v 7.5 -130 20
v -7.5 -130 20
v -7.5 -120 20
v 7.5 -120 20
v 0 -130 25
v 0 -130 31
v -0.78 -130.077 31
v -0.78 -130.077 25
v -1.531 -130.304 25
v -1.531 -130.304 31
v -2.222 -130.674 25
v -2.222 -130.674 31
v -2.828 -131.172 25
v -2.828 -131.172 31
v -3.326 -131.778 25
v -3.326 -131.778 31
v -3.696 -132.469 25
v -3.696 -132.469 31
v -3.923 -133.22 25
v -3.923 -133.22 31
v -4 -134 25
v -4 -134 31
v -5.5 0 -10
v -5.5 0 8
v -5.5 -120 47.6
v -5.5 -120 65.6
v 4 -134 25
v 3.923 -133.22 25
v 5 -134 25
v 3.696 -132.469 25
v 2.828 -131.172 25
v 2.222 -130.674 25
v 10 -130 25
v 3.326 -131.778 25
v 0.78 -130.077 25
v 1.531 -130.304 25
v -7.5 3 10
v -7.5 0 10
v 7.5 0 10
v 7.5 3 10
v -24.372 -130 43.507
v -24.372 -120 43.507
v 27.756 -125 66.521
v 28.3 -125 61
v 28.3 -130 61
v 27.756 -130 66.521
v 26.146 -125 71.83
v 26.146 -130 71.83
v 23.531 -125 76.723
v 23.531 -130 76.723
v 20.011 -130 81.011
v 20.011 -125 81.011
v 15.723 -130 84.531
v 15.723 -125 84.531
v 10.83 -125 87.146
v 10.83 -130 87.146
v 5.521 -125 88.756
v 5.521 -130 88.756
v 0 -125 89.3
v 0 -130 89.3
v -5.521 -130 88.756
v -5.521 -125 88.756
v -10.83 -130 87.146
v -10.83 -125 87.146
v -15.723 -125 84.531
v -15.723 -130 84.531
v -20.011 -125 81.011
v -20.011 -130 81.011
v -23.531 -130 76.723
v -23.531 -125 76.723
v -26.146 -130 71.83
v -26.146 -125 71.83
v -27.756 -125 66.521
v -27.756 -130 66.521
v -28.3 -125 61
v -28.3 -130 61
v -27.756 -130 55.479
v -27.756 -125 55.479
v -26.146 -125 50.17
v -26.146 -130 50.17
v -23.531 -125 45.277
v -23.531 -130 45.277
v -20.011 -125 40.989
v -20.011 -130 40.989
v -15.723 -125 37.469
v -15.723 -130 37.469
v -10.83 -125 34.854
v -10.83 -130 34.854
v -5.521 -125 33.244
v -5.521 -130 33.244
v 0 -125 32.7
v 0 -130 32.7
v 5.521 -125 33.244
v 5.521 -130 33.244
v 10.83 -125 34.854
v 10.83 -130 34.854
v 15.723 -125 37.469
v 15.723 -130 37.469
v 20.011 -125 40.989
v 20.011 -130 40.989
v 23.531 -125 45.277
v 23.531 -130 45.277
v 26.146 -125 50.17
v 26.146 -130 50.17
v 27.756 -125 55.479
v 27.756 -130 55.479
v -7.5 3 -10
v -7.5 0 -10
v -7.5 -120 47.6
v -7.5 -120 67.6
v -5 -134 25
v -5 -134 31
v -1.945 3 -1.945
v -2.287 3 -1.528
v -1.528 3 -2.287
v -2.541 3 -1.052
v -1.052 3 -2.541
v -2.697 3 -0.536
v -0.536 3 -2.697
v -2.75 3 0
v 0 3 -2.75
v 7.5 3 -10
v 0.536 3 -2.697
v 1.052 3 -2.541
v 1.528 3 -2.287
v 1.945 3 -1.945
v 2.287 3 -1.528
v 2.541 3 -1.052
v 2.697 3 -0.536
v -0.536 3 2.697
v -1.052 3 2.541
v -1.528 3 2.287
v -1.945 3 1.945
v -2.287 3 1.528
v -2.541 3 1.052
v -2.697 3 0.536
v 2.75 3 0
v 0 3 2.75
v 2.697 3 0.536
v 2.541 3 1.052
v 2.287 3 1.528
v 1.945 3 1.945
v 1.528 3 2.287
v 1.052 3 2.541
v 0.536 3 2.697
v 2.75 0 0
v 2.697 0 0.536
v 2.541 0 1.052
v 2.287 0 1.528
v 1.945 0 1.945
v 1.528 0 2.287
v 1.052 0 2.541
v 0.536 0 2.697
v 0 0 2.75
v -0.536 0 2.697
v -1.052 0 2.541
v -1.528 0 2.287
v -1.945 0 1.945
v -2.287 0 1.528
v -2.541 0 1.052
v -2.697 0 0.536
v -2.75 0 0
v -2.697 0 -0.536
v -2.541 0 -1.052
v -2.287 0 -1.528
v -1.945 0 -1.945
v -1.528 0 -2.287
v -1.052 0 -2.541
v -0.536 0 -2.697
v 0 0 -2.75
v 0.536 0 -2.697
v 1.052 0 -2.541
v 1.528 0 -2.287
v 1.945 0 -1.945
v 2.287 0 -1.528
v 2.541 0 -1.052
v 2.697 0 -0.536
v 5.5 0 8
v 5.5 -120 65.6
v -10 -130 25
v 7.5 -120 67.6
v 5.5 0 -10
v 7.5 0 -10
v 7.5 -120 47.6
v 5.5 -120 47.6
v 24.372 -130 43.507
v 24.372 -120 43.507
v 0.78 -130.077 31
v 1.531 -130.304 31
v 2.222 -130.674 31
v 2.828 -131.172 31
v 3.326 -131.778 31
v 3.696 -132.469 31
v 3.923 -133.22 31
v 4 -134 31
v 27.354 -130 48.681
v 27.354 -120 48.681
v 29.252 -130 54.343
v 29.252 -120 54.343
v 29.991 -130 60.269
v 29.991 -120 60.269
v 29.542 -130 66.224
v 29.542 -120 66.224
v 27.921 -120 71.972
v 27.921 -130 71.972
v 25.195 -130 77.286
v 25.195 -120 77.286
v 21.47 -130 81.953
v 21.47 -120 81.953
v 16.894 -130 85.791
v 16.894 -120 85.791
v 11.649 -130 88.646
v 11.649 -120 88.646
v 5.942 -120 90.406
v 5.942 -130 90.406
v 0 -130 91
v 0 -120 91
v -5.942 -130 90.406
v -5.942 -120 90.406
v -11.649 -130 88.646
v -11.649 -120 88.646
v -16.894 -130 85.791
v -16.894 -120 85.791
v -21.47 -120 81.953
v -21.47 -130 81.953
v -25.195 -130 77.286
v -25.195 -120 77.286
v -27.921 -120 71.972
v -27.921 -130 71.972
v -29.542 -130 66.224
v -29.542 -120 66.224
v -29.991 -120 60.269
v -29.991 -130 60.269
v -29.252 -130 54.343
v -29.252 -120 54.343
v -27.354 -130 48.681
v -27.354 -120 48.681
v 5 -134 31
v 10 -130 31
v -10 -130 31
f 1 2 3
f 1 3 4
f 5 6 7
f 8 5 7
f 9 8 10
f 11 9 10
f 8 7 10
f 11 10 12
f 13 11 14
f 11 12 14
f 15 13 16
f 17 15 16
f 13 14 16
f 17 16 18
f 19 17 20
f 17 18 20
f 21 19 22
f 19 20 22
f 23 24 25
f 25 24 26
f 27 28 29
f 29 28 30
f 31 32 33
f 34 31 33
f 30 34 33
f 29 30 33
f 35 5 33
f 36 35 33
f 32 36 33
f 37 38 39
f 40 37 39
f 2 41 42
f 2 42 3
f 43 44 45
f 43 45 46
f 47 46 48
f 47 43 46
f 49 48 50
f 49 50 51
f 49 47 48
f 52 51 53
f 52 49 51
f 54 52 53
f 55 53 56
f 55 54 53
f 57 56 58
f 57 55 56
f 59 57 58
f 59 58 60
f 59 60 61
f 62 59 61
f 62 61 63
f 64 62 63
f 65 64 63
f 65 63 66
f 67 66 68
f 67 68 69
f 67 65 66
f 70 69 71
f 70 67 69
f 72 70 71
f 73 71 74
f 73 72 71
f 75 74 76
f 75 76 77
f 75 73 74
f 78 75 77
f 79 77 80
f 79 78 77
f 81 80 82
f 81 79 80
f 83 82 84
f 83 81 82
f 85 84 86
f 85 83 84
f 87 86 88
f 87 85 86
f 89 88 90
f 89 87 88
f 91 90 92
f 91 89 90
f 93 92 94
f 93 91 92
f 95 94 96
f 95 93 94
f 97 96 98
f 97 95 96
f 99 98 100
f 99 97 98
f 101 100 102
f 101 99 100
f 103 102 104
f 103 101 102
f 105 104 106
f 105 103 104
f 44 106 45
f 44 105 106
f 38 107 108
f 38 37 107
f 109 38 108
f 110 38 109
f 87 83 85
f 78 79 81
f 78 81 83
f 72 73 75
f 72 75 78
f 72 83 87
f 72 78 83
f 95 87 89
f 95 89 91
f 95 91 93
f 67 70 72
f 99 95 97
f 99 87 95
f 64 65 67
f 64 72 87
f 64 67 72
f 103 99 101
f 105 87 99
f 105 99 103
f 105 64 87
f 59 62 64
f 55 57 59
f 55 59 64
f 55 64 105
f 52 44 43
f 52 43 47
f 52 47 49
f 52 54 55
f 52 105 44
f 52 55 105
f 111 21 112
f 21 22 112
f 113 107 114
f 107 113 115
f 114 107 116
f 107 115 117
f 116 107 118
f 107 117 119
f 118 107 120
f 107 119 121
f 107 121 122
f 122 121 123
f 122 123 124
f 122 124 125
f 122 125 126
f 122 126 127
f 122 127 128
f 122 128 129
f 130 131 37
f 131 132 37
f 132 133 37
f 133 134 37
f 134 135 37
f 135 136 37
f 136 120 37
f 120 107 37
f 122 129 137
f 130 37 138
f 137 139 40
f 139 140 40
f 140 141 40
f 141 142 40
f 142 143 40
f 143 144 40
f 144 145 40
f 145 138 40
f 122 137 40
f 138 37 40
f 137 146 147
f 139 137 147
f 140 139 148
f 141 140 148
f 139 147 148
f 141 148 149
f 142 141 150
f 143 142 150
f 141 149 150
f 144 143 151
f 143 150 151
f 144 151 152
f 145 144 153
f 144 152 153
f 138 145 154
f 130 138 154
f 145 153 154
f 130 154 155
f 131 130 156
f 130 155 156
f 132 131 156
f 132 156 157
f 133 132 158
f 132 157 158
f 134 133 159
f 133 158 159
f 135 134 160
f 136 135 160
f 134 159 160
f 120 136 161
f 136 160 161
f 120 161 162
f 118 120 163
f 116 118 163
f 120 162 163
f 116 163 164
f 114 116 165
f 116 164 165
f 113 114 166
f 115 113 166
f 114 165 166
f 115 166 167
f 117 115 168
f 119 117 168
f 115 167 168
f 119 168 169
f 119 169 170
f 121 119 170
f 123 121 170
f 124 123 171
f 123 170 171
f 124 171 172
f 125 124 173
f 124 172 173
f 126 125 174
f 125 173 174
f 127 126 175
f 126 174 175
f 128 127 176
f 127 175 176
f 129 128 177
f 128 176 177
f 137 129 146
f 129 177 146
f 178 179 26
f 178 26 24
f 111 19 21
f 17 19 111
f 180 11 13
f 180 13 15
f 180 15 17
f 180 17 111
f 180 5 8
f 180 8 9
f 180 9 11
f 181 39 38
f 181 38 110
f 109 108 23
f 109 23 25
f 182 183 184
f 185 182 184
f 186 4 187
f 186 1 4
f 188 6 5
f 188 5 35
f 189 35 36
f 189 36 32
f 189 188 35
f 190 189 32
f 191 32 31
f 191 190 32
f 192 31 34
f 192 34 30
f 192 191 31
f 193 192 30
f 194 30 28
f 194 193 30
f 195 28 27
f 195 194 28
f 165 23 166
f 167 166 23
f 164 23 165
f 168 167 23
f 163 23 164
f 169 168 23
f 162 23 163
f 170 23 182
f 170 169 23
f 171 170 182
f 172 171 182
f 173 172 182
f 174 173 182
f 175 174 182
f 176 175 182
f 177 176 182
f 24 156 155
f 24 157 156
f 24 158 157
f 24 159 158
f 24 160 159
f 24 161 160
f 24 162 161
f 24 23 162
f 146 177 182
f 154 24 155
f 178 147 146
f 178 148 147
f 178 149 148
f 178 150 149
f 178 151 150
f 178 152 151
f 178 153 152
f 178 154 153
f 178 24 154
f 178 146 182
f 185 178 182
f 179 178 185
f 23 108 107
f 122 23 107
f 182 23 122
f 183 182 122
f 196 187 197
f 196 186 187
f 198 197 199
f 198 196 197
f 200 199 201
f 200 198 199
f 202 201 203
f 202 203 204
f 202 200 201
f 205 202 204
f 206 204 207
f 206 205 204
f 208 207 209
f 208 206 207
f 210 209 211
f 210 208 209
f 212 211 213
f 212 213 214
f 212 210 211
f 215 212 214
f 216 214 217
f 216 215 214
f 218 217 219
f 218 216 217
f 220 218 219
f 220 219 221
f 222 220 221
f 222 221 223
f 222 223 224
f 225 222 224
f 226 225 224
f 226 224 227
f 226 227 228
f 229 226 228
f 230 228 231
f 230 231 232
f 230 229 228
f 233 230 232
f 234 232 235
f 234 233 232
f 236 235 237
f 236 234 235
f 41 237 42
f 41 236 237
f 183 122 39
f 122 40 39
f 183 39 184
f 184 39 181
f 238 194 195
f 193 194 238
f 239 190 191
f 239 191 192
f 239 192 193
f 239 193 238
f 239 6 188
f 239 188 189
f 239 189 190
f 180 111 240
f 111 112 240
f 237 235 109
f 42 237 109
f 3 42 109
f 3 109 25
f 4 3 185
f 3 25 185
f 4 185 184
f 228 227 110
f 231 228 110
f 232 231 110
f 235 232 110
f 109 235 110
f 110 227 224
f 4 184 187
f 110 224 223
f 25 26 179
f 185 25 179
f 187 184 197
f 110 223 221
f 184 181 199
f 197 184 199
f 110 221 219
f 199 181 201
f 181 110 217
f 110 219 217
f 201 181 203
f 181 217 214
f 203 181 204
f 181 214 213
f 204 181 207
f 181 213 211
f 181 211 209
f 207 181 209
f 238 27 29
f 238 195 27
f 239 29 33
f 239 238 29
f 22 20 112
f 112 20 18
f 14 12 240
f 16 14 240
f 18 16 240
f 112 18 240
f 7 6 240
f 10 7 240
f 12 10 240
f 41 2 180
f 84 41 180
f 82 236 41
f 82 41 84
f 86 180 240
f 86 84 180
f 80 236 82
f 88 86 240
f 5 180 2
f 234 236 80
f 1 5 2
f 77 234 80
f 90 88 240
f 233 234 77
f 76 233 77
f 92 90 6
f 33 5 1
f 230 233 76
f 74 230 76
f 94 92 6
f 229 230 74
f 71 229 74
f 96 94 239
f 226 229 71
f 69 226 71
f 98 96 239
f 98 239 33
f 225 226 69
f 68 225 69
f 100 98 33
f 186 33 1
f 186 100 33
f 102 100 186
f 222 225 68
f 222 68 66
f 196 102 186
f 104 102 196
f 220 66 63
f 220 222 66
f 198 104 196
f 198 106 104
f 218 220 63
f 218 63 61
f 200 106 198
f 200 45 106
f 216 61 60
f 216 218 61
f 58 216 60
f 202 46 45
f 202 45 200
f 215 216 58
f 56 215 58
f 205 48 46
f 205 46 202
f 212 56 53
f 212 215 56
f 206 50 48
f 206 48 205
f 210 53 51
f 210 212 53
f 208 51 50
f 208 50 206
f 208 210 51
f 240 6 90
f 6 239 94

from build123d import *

# Parameters (mm, degrees)
SKETCH_W     = 15
SKETCH_H     = 20
SKETCH_R     = 2.75
PAD_DEPTH    = 3
PAD001_DEPTH = 2
PAD002_DEPTH = 5.5
PAD003_DEPTH = 5
SKETCH004_R  = 28.3
POCKET_DEPTH = 5
PAD004_DEPTH = 3


with BuildPart() as part:
    # Sketch → Pad (new body)
    with BuildSketch(Plane.XZ):
        Rectangle(SKETCH_W, SKETCH_H)
        Circle(SKETCH_R, mode=Mode.SUBTRACT)
    extrude(amount=-PAD_DEPTH)

    # Sketch001 (on DatumPlane) → Pad001 (join)
    with BuildSketch(Plane.YZ.offset(7.5)):
        Polygon((0, -10), (-125, 50), (-125, 70), (0, 10), align=None)
    pad001 = extrude(amount=-PAD001_DEPTH)

    # Mirrored: Pad001 across YZ
    add(pad001.mirror(Plane.YZ))

    # Sketch002 → Pad002 (join, symmetric)
    with BuildSketch(Plane.YZ):
        Polygon((0, 10), (-125, 70), (-125, 68), (0, 8), align=None)
    extrude(amount=PAD002_DEPTH, both=True)

    # Sketch003 (on DatumPlane) → Pad003 (join, symmetric)
    with BuildSketch(Plane.XZ.offset(125)):
        with BuildLine():
            ThreePointArc((24.372074, 43.507087), (0, 91), (-24.372074, 43.507087))
            Line((-24.372074, 43.507087), (-7.5, 20))
            Line((-7.5, 20), (7.5, 20))
            Line((7.5, 20), (24.372074, 43.507087))
        make_face()
    extrude(amount=PAD003_DEPTH, both=True)

    # Sketch004 (on DatumPlane) → Pocket (cut)
    with BuildSketch(Plane.XZ.offset(125)):
        with Locations((0, 61)):
            Circle(SKETCH004_R)
    extrude(amount=POCKET_DEPTH, mode=Mode.SUBTRACT)

    # Sketch005 (on DatumPlane) → Pad004 (join, symmetric)
    with BuildSketch(Plane.XY.offset(28)):
        with BuildLine():
            ThreePointArc((0, -130), (-2.828427, -131.171573), (-4, -134))
            Line((-4, -134), (-5, -134))
            Line((-5, -134), (-10, -130))
            Line((-10, -130), (0, -130))
        make_face()
    pad004 = extrude(amount=PAD004_DEPTH, both=True)

    # Mirrored001: Pad004 across Sketch005 V_Axis
    add(pad004.mirror(Plane(origin=(0, 0, 28), x_dir=(0, 0, 1), z_dir=(1, 0, 0))))


solid = part.part
